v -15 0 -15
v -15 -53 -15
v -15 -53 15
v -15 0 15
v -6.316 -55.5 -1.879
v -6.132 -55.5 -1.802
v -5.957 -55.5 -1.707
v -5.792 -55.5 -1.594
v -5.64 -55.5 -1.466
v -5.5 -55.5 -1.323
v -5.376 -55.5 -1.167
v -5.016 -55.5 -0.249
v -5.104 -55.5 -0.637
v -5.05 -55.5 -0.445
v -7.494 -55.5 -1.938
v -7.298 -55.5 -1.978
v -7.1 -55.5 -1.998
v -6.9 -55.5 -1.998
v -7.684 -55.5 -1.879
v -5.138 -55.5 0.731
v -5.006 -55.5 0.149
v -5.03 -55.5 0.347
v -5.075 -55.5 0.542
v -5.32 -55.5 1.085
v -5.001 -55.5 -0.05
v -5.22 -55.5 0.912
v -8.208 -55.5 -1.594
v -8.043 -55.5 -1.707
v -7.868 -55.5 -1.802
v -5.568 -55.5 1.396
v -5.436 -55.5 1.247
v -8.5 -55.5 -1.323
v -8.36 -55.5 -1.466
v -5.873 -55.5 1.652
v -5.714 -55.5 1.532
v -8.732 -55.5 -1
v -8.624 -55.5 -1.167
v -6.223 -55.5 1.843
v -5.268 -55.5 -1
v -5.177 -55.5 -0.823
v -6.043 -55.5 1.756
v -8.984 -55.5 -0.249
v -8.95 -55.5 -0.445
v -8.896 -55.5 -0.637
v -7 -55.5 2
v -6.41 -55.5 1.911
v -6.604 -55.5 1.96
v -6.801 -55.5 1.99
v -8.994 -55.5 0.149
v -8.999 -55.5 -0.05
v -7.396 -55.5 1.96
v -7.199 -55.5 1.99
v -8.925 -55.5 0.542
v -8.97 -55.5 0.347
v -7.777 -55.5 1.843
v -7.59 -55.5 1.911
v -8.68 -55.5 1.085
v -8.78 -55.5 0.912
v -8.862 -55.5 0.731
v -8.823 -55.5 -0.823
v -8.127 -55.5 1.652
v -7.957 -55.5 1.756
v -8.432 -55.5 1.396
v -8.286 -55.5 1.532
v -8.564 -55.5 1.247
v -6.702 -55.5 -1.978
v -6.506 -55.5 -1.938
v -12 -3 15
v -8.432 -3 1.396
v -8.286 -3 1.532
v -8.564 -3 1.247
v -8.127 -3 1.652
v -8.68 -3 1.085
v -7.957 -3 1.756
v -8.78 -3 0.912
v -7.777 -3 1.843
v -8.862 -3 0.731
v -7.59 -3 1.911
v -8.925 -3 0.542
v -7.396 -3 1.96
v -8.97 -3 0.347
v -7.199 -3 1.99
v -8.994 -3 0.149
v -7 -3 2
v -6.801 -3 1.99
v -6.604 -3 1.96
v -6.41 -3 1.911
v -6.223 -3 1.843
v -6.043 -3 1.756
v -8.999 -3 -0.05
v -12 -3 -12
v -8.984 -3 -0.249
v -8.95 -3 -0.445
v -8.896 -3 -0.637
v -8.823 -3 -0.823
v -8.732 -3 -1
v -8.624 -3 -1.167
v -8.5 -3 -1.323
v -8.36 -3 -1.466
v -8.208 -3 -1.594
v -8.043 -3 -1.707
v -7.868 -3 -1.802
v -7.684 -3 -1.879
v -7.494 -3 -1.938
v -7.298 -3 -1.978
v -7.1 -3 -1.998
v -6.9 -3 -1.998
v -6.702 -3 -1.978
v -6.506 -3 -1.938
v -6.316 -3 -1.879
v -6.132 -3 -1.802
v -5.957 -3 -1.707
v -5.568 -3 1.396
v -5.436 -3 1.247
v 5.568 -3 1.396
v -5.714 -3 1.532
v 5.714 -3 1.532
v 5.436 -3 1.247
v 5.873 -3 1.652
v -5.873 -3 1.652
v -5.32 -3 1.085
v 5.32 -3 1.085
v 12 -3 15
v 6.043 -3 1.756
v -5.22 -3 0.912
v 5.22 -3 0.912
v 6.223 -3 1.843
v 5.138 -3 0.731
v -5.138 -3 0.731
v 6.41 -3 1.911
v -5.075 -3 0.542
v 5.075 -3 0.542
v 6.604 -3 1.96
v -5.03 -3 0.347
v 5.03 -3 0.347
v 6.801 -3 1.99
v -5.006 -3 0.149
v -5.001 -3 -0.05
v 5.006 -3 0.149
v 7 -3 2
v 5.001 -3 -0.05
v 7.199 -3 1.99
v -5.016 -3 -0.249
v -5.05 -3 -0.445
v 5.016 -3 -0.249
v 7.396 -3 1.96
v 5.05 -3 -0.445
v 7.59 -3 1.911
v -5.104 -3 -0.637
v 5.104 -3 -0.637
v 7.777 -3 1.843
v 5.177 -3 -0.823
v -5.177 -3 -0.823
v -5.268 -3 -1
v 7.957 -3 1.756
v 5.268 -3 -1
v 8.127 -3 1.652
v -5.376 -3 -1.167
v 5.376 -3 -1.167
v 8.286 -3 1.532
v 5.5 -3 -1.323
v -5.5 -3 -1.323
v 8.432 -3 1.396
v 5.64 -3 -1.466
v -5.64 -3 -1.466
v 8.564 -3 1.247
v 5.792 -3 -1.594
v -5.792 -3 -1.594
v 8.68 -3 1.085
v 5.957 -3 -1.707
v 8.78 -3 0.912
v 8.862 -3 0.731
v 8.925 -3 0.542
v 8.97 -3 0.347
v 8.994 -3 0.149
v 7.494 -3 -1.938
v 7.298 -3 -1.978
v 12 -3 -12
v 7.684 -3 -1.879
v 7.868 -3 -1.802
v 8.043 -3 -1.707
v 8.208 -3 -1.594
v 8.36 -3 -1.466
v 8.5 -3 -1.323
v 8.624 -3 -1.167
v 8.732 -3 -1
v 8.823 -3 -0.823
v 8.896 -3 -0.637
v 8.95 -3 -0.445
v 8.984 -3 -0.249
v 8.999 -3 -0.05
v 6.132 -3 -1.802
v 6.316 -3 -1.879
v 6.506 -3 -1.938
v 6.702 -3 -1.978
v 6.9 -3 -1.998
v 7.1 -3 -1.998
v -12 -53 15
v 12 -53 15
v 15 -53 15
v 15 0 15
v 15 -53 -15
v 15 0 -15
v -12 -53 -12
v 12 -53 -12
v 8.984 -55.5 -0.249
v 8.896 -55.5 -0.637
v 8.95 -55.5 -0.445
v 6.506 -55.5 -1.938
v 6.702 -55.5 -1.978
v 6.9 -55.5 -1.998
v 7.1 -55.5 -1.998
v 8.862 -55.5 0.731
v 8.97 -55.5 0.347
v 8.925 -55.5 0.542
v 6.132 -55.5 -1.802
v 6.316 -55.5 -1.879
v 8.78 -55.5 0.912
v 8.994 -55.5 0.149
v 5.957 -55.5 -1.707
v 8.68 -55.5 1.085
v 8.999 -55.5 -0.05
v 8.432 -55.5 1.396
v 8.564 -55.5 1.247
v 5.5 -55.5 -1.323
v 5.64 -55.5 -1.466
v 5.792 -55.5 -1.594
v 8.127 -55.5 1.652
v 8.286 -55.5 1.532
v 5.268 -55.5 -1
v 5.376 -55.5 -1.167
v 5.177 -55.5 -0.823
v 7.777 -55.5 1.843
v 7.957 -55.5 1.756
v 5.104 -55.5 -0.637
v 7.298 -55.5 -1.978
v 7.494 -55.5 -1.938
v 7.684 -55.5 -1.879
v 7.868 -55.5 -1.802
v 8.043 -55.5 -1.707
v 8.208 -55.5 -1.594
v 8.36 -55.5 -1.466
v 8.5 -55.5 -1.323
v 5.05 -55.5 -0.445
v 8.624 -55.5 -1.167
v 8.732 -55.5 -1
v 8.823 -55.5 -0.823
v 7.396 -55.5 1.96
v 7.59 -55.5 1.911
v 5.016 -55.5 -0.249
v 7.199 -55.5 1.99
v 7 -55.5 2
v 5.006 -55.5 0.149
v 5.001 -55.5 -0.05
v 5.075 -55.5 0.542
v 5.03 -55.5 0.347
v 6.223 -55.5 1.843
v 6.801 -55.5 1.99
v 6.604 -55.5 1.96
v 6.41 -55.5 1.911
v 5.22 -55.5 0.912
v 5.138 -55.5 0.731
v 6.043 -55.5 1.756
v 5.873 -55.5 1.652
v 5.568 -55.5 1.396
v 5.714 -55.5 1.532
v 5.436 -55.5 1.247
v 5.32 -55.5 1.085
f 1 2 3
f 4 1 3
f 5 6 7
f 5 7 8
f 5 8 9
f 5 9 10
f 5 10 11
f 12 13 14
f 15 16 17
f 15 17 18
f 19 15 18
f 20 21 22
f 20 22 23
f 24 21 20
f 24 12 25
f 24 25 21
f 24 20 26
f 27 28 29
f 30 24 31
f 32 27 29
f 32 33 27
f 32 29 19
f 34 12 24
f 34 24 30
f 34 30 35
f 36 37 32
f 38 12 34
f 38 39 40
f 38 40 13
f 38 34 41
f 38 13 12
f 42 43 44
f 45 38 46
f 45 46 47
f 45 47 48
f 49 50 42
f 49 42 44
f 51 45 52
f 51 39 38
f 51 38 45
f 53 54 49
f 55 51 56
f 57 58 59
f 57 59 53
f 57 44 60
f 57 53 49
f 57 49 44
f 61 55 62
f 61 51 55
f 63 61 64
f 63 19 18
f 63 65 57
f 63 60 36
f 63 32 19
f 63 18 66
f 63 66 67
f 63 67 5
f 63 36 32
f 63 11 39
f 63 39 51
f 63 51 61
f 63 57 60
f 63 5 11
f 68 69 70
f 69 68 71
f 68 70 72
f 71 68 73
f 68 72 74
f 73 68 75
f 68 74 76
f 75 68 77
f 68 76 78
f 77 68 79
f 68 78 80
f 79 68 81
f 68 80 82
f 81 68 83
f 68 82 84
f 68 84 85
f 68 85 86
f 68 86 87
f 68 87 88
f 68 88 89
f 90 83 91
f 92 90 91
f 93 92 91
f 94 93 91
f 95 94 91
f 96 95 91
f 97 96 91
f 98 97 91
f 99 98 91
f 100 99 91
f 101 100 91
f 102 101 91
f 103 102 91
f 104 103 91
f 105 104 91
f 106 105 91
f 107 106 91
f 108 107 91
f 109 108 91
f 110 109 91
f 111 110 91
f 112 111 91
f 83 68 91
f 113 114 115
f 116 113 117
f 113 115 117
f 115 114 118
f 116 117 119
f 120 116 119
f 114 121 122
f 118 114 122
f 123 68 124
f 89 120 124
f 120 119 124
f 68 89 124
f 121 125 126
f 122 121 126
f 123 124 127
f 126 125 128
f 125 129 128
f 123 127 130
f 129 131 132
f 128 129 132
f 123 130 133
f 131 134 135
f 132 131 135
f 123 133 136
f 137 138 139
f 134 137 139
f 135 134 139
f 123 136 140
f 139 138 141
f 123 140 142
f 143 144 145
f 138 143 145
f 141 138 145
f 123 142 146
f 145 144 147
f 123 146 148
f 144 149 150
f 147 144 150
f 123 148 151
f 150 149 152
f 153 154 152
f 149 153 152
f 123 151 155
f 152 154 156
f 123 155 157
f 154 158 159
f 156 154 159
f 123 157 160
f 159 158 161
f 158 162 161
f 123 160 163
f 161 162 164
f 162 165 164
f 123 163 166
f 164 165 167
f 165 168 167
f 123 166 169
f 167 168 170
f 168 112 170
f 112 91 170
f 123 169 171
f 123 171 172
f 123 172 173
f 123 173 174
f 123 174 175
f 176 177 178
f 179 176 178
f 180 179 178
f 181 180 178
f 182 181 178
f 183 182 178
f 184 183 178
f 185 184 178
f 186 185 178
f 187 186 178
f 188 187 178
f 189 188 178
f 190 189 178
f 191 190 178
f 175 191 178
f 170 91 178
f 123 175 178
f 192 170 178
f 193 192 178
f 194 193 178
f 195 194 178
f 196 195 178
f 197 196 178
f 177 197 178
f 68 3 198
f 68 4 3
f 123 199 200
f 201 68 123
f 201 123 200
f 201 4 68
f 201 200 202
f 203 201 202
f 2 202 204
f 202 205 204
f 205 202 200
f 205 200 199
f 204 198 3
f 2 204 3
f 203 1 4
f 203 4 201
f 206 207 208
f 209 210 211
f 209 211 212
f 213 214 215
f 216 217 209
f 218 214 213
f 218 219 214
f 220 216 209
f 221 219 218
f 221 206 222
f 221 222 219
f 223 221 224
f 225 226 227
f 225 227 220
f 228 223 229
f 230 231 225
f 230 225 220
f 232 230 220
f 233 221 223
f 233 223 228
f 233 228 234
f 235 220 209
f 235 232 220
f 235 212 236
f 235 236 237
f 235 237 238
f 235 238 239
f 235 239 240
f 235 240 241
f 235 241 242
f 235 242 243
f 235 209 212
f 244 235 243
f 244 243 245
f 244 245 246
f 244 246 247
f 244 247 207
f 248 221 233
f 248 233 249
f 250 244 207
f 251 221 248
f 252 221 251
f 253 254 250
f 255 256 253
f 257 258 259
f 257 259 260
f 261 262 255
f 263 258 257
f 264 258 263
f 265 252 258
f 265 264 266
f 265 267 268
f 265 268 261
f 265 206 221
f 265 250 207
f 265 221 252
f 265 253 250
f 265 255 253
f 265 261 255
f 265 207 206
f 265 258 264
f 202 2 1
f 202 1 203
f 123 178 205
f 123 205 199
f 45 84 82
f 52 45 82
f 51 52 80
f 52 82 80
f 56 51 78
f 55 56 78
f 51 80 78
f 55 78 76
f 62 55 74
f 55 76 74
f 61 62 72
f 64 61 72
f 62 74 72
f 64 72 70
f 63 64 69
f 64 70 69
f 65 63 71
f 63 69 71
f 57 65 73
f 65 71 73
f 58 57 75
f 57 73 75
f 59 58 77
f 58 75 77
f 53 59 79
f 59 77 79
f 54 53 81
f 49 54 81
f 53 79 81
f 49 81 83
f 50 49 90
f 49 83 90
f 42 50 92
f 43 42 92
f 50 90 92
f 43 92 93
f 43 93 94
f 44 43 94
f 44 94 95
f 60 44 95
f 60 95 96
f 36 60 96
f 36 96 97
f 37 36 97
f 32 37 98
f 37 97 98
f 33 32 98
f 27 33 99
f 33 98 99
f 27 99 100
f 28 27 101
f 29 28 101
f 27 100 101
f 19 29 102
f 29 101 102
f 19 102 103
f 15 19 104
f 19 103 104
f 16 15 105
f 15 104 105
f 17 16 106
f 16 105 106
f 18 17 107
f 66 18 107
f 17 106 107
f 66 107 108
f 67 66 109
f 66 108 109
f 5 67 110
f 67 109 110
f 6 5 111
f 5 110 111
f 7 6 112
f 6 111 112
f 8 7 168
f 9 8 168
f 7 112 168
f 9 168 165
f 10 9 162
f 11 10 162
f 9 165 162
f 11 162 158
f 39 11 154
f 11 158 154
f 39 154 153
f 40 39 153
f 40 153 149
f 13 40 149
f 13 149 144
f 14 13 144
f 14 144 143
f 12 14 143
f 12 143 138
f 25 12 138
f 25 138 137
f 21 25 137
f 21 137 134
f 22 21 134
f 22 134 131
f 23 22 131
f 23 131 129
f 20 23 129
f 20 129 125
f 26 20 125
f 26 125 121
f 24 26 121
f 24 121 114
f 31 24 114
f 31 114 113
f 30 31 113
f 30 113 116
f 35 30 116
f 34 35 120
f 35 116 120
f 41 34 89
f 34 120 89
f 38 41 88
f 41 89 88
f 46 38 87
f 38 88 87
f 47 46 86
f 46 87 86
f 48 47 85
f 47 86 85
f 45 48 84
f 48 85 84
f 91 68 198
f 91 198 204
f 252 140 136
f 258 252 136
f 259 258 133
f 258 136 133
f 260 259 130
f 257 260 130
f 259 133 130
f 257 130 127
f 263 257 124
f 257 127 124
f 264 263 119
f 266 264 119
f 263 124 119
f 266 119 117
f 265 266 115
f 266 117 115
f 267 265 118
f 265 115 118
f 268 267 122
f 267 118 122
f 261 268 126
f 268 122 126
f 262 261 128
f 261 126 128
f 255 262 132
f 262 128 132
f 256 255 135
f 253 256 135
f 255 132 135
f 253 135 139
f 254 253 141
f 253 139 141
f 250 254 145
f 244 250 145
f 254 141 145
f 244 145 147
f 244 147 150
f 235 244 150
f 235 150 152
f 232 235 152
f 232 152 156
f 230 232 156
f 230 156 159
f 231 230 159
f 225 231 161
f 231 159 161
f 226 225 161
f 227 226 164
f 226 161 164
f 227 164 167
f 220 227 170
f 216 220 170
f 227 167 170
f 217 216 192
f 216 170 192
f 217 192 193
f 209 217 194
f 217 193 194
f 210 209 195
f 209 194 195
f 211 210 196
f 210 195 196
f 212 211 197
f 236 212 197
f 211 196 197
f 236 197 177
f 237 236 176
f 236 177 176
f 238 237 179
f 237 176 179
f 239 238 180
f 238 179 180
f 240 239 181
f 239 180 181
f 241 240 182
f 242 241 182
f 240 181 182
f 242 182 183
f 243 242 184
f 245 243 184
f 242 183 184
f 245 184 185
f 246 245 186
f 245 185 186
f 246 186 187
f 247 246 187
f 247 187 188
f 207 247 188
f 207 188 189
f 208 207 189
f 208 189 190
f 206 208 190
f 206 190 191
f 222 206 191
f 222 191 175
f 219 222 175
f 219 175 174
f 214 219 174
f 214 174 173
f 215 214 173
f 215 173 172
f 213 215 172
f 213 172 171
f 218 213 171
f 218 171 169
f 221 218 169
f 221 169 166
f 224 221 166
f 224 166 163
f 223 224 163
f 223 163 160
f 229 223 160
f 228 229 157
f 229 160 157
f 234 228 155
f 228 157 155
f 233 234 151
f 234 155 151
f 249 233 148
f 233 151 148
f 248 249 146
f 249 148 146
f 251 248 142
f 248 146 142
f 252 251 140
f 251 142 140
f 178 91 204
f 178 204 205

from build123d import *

# Parameters (mm, degrees)
CROQUIS1_W              = 30
CROQUIS1_H              = 30
SALIENTE_EXTRUIR2_DEPTH = 3
SALIENTE_EXTRUIR3_DEPTH = 50
CROQUIS3_R              = 2
SALIENTE_EXTRUIR4_DEPTH = 52.5


with BuildPart() as part:
    # Croquis1 → Saliente-Extruir2 (new body)
    with BuildSketch(Plane(origin=(0, 0, 0), x_dir=(1, 0, 0), z_dir=(0, 1, 0))):
        Rectangle(CROQUIS1_W, CROQUIS1_H)
    extrude(amount=-SALIENTE_EXTRUIR2_DEPTH)

    # Croquis2 → Saliente-Extruir3 (add)
    with BuildSketch(Plane.XZ.offset(3)):
        Polygon((-15, 15), (-12, 15), (-12, -12), (12, -12), (12, 15), (15, 15), (15, -15), (12, -15), (-12, -15), (-15, -15), align=None)
    extrude(amount=SALIENTE_EXTRUIR3_DEPTH)

    # Croquis3 → Saliente-Extruir4 (add)
    with BuildSketch(Plane.XZ.offset(3)):
        with Locations(Location((-7, 0, 0), (0, 0, 90))):
            Circle(CROQUIS3_R)
        with Locations(Location((7, 0, 0), (0, 0, 90))):
            Circle(CROQUIS3_R)
    extrude(amount=SALIENTE_EXTRUIR4_DEPTH)


solid = part.part
